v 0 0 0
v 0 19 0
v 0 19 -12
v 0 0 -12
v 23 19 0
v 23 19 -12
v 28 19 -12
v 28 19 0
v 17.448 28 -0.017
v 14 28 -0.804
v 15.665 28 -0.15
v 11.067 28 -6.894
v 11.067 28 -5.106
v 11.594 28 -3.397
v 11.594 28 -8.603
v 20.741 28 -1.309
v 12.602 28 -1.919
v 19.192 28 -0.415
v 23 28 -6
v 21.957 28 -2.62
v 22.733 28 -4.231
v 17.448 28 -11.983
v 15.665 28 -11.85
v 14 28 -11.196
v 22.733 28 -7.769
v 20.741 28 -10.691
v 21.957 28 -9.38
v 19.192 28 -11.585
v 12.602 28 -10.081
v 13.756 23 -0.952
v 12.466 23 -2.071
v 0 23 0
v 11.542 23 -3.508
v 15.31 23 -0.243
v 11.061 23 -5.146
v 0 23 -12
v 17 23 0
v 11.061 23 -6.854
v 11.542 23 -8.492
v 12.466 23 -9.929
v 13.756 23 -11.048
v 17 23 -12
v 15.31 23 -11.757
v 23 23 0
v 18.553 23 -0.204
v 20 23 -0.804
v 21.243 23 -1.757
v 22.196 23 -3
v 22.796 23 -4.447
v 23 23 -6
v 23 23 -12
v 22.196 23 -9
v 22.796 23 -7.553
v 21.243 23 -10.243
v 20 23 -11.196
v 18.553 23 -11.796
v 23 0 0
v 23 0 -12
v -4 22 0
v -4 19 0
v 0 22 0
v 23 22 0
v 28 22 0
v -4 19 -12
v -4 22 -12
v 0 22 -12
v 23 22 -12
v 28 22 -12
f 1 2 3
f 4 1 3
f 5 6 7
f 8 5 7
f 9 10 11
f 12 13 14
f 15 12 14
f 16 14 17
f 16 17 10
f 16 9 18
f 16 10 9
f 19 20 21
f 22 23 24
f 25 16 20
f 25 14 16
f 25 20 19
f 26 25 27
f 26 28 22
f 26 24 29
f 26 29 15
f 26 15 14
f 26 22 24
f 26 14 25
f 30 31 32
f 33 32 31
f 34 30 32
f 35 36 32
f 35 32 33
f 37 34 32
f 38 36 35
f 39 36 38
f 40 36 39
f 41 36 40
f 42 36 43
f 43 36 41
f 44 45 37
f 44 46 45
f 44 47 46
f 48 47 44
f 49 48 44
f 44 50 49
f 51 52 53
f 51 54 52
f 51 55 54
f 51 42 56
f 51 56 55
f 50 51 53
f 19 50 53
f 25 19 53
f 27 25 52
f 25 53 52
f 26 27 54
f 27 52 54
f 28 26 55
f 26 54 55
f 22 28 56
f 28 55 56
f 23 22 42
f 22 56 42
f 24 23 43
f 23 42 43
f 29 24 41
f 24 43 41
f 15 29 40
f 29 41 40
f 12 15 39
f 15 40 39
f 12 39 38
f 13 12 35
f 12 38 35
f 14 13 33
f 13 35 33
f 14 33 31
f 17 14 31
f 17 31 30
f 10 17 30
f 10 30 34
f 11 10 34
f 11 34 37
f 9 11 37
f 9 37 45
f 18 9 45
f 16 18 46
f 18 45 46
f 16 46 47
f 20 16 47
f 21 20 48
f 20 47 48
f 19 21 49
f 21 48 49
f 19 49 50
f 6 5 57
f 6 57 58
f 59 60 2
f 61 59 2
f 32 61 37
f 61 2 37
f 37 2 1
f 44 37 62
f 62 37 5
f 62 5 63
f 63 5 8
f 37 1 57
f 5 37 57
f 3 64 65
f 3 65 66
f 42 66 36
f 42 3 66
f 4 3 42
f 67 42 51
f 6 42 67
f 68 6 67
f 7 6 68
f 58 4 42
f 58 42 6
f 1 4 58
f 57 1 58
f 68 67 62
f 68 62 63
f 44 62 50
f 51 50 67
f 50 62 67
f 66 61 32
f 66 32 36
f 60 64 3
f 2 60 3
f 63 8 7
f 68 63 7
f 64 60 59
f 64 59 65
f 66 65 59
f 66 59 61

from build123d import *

# Parameters (mm, degrees)
CORPS_SERVO_W      = 23
CORPS_SERVO_H      = 12
BOSS_EXTRU_2_DEPTH = 19
PLAQUE_TROUS_W     = 32
PLAQUE_TROUS_H     = 12
BOSS_EXTRU_3_DEPTH = 3
ESQUISSE5_W        = 23
ESQUISSE5_H        = 12
BOSS_EXTRU_4_DEPTH = 1
ESQUISSE6_R        = 6
BOSS_EXTRU_5_DEPTH = 5


with BuildPart() as part:
    # corps servo → Boss.-Extru.2 (new body)
    with BuildSketch(Plane(origin=(0, 0, 0), x_dir=(1, 0, 0), z_dir=(0, 1, 0))):
        with Locations((11.5, 6)):
            Rectangle(CORPS_SERVO_W, CORPS_SERVO_H)
    extrude(amount=BOSS_EXTRU_2_DEPTH)

    # plaque trous → Boss.-Extru.3 (add)
    with BuildSketch(Plane(origin=(0, 19, 0), x_dir=(1, 0, 0), z_dir=(0, 1, 0))):
        with Locations((12, 6)):
            Rectangle(PLAQUE_TROUS_W, PLAQUE_TROUS_H)
    extrude(amount=BOSS_EXTRU_3_DEPTH)

    # Esquisse5 → Boss.-Extru.4 (add)
    with BuildSketch(Plane(origin=(0, 22, 0), x_dir=(1, 0, 0), z_dir=(0, 1, 0))):
        with Locations((11.5, 6)):
            Rectangle(ESQUISSE5_W, ESQUISSE5_H)
    extrude(amount=BOSS_EXTRU_4_DEPTH)

    # Esquisse6 → Boss.-Extru.5 (add)
    with BuildSketch(Plane(origin=(0, 23, 0), x_dir=(1, 0, 0), z_dir=(0, 1, 0))):
        with Locations((17, 6)):
            Circle(ESQUISSE6_R)
    extrude(amount=BOSS_EXTRU_5_DEPTH)


solid = part.part
